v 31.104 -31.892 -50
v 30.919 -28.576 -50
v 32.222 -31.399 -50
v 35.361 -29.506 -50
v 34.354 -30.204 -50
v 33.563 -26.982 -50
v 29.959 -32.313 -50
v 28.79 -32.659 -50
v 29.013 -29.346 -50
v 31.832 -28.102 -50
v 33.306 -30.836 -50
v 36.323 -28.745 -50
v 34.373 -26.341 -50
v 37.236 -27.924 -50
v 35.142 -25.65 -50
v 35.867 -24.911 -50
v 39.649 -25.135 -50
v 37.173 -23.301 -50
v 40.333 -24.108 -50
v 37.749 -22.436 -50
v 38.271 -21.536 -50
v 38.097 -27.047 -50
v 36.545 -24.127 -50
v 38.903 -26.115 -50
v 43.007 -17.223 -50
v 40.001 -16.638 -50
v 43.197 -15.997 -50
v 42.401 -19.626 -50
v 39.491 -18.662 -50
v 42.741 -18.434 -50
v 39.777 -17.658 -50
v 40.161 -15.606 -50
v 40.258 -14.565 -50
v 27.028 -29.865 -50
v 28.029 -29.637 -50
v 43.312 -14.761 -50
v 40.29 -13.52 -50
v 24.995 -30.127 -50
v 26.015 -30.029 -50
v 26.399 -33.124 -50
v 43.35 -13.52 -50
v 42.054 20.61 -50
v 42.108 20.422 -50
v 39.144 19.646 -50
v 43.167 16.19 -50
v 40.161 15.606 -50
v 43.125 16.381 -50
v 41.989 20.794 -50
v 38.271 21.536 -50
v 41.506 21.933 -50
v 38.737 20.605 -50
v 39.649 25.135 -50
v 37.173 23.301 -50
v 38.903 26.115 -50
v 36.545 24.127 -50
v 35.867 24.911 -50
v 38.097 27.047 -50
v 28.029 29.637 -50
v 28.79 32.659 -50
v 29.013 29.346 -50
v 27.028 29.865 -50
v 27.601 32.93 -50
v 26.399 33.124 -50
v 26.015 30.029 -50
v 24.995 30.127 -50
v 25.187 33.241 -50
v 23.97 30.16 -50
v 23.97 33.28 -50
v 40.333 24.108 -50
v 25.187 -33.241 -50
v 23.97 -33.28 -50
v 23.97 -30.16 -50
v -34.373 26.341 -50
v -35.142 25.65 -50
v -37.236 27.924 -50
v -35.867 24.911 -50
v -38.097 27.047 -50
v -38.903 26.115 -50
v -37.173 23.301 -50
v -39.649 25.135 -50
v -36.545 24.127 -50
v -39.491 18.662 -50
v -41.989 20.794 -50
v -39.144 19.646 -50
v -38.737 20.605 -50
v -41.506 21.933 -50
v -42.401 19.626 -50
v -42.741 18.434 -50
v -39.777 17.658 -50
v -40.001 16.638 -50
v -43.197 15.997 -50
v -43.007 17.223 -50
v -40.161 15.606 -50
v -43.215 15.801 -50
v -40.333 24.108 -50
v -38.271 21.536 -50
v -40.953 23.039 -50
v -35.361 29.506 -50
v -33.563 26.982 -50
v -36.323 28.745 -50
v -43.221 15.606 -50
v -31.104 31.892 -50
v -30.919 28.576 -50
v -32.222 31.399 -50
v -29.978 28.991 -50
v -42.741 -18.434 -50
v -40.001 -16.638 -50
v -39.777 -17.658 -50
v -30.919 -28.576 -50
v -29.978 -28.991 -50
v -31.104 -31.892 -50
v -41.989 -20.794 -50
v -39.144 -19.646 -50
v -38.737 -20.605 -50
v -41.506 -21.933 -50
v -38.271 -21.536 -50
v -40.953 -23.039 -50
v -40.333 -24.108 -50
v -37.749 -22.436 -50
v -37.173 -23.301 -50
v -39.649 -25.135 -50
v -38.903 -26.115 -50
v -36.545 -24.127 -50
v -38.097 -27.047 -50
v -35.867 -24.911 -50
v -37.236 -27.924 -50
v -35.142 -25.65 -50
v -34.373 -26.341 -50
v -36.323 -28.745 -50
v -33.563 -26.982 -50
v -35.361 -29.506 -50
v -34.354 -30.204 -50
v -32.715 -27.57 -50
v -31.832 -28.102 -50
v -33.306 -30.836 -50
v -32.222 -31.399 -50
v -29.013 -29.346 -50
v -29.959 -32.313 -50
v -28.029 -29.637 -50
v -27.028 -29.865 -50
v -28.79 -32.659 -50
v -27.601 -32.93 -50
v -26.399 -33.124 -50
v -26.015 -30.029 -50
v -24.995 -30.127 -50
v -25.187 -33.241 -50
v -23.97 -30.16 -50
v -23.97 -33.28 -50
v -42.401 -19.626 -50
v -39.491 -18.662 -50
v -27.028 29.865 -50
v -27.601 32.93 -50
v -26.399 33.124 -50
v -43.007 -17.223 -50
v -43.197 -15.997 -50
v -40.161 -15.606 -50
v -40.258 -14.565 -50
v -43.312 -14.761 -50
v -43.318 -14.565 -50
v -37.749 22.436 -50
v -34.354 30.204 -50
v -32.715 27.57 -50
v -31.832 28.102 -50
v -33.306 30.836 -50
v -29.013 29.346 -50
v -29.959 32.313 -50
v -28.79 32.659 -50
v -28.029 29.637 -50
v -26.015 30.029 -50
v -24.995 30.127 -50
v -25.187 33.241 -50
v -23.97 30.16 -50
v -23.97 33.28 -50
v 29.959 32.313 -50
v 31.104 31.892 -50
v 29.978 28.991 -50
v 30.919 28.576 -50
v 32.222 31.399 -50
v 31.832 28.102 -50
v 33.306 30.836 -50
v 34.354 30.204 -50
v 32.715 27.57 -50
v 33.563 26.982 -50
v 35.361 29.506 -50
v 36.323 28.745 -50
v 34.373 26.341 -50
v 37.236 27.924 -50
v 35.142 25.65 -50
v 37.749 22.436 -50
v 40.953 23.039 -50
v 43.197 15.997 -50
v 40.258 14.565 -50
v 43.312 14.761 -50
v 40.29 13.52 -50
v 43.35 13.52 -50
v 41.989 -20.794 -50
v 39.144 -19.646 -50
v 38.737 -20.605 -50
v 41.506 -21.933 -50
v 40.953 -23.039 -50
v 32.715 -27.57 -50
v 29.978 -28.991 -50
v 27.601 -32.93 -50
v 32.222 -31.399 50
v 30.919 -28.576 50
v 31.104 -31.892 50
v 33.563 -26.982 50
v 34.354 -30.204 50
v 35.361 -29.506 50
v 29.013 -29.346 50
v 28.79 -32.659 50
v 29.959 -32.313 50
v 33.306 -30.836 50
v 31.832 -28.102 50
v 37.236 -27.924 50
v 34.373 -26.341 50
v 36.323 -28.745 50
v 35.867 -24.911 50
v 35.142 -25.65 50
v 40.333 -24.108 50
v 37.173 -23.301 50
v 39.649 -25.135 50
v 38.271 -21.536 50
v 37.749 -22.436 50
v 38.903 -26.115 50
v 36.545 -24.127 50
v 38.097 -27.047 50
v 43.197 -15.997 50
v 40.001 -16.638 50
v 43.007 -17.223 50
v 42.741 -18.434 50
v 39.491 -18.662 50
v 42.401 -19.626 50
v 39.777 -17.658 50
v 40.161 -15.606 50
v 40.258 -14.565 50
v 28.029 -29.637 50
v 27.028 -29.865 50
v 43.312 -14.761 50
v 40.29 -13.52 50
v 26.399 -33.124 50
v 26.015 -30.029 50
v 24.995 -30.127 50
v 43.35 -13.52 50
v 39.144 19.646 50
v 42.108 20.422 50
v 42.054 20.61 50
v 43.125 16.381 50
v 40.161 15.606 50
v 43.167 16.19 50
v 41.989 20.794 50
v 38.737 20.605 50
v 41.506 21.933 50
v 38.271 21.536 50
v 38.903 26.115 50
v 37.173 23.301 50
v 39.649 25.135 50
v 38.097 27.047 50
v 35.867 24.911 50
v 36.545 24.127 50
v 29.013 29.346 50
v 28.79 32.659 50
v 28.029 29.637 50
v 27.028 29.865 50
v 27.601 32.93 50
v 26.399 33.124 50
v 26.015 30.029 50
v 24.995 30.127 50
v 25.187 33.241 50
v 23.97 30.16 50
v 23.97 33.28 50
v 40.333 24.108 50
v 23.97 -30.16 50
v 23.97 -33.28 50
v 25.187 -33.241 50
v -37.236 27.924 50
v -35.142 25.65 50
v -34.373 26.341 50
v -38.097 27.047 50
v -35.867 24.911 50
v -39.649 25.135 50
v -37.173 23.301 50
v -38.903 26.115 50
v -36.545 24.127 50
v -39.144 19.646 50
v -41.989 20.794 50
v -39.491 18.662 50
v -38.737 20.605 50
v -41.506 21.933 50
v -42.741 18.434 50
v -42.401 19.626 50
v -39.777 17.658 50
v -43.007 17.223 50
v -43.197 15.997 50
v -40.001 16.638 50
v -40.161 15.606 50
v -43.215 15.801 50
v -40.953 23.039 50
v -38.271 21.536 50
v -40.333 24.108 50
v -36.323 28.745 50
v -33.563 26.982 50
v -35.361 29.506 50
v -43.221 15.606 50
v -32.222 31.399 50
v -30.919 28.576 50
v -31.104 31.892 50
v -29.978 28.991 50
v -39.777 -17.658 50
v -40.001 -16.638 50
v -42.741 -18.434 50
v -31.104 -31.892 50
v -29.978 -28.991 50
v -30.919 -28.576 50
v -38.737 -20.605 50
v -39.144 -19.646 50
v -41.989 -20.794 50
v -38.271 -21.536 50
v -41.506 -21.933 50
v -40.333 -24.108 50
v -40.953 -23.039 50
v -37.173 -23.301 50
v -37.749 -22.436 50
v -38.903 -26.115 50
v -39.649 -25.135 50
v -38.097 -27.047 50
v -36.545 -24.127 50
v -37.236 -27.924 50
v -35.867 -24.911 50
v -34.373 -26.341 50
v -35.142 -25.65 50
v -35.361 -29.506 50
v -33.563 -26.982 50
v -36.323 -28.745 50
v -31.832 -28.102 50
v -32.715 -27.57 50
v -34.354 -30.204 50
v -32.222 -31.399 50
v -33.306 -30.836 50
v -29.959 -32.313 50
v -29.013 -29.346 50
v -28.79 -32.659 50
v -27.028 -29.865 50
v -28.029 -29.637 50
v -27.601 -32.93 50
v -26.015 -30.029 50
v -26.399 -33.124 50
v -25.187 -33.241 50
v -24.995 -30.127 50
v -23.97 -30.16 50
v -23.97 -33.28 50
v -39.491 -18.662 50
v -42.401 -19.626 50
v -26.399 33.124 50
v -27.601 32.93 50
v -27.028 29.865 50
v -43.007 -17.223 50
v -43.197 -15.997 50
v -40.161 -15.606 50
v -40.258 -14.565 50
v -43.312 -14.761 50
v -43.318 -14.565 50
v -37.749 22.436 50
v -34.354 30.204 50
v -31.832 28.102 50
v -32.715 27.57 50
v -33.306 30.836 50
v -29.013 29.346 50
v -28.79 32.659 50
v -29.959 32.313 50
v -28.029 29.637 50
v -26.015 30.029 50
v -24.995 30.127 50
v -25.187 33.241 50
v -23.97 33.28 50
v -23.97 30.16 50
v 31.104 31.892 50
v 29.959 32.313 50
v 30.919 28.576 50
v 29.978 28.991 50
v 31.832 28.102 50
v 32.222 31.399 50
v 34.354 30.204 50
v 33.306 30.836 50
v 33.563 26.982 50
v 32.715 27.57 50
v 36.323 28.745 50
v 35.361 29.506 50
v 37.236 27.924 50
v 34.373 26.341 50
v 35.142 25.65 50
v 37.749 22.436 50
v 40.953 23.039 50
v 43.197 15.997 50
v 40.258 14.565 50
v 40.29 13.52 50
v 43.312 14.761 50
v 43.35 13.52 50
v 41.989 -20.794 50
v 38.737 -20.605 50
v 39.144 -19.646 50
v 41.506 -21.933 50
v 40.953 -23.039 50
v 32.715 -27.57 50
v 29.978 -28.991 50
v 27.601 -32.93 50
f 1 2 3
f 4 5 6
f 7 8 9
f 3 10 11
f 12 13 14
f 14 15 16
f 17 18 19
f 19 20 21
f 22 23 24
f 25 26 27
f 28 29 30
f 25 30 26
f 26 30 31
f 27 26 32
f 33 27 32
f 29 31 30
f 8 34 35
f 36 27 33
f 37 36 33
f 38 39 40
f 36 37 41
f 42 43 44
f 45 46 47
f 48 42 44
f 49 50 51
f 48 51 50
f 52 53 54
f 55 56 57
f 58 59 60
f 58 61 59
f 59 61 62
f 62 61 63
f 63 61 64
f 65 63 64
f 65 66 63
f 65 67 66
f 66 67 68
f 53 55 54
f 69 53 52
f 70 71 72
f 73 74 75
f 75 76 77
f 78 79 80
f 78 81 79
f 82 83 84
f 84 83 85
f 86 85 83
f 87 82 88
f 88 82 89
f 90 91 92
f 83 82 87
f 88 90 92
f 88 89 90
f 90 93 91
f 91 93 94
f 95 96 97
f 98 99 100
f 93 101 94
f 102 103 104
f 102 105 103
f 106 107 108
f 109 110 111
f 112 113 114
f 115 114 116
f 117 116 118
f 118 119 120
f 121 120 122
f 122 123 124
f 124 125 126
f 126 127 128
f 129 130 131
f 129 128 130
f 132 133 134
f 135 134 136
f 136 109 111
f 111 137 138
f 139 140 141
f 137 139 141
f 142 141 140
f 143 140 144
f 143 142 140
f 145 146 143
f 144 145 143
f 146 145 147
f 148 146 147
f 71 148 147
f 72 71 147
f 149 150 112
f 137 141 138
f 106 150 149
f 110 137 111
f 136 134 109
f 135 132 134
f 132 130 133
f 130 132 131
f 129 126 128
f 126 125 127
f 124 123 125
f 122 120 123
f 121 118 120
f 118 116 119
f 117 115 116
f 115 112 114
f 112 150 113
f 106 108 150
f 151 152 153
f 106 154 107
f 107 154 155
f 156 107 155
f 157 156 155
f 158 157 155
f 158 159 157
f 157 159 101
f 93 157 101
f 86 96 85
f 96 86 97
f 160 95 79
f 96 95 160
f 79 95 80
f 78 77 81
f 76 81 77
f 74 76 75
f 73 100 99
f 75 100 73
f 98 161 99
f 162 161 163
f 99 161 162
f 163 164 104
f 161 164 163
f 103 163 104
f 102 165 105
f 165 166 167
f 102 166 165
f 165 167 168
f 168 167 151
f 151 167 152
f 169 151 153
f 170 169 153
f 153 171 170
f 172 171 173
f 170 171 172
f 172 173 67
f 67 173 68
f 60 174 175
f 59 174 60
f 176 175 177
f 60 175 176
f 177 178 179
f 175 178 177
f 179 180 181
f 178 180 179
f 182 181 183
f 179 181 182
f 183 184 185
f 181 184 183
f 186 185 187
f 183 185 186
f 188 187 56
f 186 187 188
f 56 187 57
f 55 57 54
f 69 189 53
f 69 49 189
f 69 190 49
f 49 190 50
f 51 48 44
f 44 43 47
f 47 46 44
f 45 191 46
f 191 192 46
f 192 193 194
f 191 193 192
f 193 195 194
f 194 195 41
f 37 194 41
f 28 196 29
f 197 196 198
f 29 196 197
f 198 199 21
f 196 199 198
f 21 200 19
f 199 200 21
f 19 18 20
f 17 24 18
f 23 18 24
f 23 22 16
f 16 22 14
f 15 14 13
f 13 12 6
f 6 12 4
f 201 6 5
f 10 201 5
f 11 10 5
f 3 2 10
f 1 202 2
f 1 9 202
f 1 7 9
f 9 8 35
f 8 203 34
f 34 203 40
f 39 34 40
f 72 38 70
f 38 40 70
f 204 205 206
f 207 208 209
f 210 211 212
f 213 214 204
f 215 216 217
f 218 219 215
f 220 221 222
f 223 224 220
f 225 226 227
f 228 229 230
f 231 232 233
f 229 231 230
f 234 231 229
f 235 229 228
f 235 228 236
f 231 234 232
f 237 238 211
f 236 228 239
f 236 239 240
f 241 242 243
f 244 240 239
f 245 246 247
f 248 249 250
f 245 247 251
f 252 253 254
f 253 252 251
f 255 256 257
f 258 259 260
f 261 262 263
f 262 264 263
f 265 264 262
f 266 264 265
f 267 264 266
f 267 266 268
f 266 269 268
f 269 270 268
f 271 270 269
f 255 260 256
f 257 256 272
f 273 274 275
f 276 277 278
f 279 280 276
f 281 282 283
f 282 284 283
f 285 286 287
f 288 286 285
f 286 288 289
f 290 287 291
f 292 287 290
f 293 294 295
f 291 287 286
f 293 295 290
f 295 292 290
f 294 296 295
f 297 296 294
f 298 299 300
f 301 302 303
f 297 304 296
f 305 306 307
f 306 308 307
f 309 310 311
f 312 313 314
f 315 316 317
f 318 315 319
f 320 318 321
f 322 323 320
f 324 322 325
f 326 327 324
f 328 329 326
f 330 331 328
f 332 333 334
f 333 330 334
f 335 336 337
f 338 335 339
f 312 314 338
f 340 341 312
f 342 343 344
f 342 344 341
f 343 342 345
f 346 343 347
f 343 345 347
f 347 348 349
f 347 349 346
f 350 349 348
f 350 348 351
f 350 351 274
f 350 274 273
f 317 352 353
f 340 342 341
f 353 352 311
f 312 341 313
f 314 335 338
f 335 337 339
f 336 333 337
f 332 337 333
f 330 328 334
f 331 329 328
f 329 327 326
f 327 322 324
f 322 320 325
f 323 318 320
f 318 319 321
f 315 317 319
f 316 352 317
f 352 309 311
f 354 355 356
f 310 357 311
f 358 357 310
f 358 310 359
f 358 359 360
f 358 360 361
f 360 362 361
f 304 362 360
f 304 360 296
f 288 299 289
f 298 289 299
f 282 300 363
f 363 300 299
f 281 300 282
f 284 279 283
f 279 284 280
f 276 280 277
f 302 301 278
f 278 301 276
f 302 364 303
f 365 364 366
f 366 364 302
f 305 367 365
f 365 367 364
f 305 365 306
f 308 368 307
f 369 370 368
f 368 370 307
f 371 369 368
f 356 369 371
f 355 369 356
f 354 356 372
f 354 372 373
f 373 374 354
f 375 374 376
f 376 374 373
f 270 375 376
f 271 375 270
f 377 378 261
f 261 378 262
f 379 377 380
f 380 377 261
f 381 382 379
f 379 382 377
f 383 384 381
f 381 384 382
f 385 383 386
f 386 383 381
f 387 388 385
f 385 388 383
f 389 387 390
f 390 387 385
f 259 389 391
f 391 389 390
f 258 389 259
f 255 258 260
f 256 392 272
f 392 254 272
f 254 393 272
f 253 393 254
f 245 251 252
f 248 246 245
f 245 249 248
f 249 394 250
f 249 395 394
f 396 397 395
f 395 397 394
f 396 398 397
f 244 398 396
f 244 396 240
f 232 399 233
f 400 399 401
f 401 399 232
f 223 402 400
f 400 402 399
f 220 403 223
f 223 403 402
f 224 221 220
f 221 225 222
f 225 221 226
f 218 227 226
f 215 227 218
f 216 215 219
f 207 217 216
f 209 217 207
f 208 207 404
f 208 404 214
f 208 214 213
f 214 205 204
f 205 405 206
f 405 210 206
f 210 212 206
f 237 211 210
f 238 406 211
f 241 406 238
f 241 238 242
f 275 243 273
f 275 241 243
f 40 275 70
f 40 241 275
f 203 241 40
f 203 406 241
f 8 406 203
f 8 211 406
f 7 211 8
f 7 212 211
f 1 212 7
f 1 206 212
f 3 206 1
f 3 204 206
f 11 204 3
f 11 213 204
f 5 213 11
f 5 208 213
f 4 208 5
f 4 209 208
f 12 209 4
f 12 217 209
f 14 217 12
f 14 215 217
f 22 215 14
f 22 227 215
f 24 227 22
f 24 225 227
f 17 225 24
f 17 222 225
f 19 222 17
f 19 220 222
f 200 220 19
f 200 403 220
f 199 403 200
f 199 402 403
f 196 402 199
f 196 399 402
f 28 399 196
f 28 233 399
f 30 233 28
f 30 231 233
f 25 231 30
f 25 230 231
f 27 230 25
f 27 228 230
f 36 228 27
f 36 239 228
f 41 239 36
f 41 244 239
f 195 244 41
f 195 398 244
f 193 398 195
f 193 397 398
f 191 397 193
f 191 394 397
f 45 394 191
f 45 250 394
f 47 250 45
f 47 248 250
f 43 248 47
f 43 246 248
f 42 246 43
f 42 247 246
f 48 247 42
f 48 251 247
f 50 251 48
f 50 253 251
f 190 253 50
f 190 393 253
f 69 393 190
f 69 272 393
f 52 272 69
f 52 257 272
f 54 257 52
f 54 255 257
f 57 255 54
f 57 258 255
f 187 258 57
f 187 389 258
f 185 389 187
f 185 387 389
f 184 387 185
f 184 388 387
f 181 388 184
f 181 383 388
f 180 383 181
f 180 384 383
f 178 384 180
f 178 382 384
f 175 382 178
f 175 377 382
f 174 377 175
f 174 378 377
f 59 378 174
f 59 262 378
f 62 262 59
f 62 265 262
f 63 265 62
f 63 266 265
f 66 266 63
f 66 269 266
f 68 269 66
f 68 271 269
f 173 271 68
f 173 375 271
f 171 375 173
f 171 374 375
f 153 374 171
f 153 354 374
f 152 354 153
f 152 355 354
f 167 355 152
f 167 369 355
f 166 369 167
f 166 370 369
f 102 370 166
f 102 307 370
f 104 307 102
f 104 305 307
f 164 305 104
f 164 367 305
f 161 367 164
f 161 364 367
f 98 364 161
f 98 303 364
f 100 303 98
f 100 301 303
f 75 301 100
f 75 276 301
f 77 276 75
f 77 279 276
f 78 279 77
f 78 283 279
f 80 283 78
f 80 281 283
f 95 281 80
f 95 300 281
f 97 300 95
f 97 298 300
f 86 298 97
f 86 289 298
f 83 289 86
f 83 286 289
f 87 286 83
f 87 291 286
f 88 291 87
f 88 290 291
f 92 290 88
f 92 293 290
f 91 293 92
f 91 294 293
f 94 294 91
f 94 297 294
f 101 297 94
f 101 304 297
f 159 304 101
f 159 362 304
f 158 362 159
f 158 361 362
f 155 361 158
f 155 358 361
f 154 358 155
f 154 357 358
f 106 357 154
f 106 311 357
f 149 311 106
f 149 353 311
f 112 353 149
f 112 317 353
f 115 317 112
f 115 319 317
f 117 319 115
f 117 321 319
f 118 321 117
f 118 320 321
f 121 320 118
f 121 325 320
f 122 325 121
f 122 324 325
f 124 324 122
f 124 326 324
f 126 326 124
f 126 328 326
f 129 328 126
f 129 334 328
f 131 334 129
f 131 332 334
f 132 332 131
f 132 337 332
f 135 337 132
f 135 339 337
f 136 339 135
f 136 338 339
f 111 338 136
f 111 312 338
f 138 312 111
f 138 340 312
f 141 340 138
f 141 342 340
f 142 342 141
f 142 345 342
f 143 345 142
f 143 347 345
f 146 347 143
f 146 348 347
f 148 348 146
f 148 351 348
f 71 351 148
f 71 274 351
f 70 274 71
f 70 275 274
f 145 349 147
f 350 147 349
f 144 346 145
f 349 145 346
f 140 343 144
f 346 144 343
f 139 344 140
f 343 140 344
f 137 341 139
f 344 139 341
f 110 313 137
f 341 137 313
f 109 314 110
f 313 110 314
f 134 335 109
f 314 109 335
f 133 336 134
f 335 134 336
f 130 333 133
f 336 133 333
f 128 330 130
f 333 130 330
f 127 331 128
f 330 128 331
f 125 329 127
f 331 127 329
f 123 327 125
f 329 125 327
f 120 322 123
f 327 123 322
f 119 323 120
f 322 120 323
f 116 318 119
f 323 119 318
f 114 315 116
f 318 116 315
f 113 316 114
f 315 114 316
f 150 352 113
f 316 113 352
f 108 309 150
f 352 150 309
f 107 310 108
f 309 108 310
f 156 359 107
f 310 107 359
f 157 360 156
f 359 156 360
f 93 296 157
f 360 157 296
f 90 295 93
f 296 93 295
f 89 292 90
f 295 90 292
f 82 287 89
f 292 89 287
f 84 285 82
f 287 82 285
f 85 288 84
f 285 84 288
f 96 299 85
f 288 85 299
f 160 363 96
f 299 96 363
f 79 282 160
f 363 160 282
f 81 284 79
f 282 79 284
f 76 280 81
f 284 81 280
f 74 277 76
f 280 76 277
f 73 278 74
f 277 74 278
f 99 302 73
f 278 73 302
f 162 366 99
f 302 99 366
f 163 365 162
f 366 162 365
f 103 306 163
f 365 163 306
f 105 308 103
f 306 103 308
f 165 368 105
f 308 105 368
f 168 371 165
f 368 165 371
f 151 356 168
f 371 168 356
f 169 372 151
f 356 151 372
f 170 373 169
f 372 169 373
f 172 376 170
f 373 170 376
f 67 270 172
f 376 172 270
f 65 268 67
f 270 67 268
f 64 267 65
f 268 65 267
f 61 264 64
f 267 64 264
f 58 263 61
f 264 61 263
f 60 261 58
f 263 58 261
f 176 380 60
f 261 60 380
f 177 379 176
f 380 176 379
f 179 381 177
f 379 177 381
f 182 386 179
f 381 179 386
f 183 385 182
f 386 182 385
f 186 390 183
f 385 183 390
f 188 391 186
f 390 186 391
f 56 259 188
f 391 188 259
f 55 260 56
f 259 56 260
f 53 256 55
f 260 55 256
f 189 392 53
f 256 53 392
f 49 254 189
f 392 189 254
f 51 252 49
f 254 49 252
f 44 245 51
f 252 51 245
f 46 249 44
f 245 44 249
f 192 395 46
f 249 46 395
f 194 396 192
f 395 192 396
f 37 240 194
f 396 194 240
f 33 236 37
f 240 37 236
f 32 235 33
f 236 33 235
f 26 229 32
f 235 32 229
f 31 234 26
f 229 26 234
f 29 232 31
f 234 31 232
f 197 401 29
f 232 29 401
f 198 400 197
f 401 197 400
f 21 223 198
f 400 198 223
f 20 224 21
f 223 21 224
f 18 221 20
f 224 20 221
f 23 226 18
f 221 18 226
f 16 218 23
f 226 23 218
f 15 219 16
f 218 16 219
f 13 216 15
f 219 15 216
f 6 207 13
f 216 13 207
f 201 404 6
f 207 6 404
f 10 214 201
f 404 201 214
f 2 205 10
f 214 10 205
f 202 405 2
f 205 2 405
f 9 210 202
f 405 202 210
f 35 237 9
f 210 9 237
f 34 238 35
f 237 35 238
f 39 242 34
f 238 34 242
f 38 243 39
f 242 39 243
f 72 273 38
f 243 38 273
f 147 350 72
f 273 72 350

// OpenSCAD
/*
Description : create a table-saw guide for ripping downspout on table saw.
*/

/*****************************************************************************
CONSTANTS
*****************************************************************************/
$fn=100;
PI = 4 * atan2(1,1);
GUIDE_SCALE = [1.02,1.04,100]; //best setting for guide, has enough play to all sliding but not sloppy.
FEMALE_ATTACHMENT_SCALE = [1,1.02,20]; //a very tight attachment.
GUIDE_WALL = 3;

/*****************************************************************************
FUNCTIONS - code to make reading modules easier to understand.
******************************************************************************/
function half(x) = x/2;

/*****************************************************************************
Directives - defines what to build with optional features.
*****************************************************************************/
INCLUDE_THING = 0;
BUILD_THING = 1;

/*****************************************************************************
MAIN SUB - where the instructions start.
*****************************************************************************/
build();

/*****************************************************************************
MODULES: - the meat of the project.
*****************************************************************************/
module build()
{
    draw(GUIDE_SCALE,[0,0,0],downspout,GUIDE_WALL,1);
}

/*
simple method for drawing a scaled polygon.
scale - [x,y,z] scaling vectors
move - [x,y,z] direction vectors
shape - [[x,y]] array of points defining polygon
wall - thickness of wall. only for hollow objects
hollow - 0 or 1.
*/
module draw(scale, move, shape, wall, hollow)
{
    translate(move) 
    scale(scale) 
    linear_extrude(1,center=true)
    if (hollow)
    {
        difference()
        {
            minkowski()
            {
                polygon(shape);
                circle(wall);
            }
            
            polygon(shape);
        }
    }
    else
    {
        polygon(shape);
    }
}

downspout = [
//[38.9973,16.979],
//[39.2166,15.9981],
//[38.7169,17.9443],
//[-39.5,13],
//[-39.4684,14.0046],
//[-39.5,-13],
[-39.3738,15.0053],
[-39.2166,15.9981],
[-38.9973,16.979],
[-38.7169,17.9443],
[-38.3764,18.89],
[-37.9772,19.8125],
[-37.5209,20.7081],
[-37.0092,21.5732],
[-36.4443,22.4046],
[-35.8282,23.1988],
[-35.1635,23.9527],
[-34.4527,24.6635],
[-33.6988,25.3282],
[-32.9046,25.9443],
[-32.0732,26.5092],
[-31.2081,27.0209],
[-30.3125,27.4772],
[-29.39,27.8764],
[-28.4443,28.2169],
[-27.479,28.4973],
[-26.4981,28.7166],
[-25.5053,28.8738],
[-24.5046,28.9684],
[-23.5,29],
[23.5,29],
[24.5046,28.9684],
[25.5053,28.8738],
[26.4981,28.7166],
[27.479,28.4973],
[28.4443,28.2169],
[29.39,27.8764],
[30.3125,27.4772],
[31.2081,27.0209],
[32.0732,26.5092],
[32.9046,25.9443],
[33.6988,25.3282],
[34.4527,24.6635],
[35.1635,23.9527],
[35.8282,23.1988],
[36.4443,22.4046],
[37.0092,21.5732],
[37.5209,20.7081],
[37.9772,19.8125],
[38.3764,18.89],
[39.3738,15.0053],
[39.4684,14.0046],
[39.5,13],
[39.5,-13],
[39.4684,-14.0046],
[39.3738,-15.0053],
[39.2166,-15.9981],
[38.9973,-16.979],
[38.7169,-17.9443],
[38.3764,-18.89],
[37.9772,-19.8125],
[37.5209,-20.7081],
[37.0092,-21.5732],
[36.4443,-22.4046],
[35.8282,-23.1988],
[35.1635,-23.9527],
[34.4527,-24.6635],
[33.6988,-25.3282],
[32.9046,-25.9443],
[32.0732,-26.5092],
[31.2081,-27.0209],
[30.3125,-27.4772],
[29.39,-27.8764],
[28.4443,-28.2169],
[27.479,-28.4973],
[26.4981,-28.7166],
[25.5053,-28.8738],
[24.5046,-28.9684],
[23.5,-29],
[-23.5,-29],
[-24.5046,-28.9684],
[-25.5053,-28.8738],
[-26.4981,-28.7166],
[-27.479,-28.4973],
[-28.4443,-28.2169],
[-29.39,-27.8764],
[-30.3125,-27.4772],
[-31.2081,-27.0209],
[-32.0732,-26.5092],
[-32.9046,-25.9443],
[-33.6988,-25.3282],
[-34.4527,-24.6635],
[-35.1635,-23.9527],
[-35.8282,-23.1988],
[-36.4443,-22.4046],
[-37.0092,-21.5732],
[-37.5209,-20.7081],
[-37.9772,-19.8125],
[-38.3764,-18.89],
[-38.7169,-17.9443],
[-38.9973,-16.979],
[-39.2166,-15.9981],
[-39.3738,-15.0053],
[-39.4684,-14.0046],
];
